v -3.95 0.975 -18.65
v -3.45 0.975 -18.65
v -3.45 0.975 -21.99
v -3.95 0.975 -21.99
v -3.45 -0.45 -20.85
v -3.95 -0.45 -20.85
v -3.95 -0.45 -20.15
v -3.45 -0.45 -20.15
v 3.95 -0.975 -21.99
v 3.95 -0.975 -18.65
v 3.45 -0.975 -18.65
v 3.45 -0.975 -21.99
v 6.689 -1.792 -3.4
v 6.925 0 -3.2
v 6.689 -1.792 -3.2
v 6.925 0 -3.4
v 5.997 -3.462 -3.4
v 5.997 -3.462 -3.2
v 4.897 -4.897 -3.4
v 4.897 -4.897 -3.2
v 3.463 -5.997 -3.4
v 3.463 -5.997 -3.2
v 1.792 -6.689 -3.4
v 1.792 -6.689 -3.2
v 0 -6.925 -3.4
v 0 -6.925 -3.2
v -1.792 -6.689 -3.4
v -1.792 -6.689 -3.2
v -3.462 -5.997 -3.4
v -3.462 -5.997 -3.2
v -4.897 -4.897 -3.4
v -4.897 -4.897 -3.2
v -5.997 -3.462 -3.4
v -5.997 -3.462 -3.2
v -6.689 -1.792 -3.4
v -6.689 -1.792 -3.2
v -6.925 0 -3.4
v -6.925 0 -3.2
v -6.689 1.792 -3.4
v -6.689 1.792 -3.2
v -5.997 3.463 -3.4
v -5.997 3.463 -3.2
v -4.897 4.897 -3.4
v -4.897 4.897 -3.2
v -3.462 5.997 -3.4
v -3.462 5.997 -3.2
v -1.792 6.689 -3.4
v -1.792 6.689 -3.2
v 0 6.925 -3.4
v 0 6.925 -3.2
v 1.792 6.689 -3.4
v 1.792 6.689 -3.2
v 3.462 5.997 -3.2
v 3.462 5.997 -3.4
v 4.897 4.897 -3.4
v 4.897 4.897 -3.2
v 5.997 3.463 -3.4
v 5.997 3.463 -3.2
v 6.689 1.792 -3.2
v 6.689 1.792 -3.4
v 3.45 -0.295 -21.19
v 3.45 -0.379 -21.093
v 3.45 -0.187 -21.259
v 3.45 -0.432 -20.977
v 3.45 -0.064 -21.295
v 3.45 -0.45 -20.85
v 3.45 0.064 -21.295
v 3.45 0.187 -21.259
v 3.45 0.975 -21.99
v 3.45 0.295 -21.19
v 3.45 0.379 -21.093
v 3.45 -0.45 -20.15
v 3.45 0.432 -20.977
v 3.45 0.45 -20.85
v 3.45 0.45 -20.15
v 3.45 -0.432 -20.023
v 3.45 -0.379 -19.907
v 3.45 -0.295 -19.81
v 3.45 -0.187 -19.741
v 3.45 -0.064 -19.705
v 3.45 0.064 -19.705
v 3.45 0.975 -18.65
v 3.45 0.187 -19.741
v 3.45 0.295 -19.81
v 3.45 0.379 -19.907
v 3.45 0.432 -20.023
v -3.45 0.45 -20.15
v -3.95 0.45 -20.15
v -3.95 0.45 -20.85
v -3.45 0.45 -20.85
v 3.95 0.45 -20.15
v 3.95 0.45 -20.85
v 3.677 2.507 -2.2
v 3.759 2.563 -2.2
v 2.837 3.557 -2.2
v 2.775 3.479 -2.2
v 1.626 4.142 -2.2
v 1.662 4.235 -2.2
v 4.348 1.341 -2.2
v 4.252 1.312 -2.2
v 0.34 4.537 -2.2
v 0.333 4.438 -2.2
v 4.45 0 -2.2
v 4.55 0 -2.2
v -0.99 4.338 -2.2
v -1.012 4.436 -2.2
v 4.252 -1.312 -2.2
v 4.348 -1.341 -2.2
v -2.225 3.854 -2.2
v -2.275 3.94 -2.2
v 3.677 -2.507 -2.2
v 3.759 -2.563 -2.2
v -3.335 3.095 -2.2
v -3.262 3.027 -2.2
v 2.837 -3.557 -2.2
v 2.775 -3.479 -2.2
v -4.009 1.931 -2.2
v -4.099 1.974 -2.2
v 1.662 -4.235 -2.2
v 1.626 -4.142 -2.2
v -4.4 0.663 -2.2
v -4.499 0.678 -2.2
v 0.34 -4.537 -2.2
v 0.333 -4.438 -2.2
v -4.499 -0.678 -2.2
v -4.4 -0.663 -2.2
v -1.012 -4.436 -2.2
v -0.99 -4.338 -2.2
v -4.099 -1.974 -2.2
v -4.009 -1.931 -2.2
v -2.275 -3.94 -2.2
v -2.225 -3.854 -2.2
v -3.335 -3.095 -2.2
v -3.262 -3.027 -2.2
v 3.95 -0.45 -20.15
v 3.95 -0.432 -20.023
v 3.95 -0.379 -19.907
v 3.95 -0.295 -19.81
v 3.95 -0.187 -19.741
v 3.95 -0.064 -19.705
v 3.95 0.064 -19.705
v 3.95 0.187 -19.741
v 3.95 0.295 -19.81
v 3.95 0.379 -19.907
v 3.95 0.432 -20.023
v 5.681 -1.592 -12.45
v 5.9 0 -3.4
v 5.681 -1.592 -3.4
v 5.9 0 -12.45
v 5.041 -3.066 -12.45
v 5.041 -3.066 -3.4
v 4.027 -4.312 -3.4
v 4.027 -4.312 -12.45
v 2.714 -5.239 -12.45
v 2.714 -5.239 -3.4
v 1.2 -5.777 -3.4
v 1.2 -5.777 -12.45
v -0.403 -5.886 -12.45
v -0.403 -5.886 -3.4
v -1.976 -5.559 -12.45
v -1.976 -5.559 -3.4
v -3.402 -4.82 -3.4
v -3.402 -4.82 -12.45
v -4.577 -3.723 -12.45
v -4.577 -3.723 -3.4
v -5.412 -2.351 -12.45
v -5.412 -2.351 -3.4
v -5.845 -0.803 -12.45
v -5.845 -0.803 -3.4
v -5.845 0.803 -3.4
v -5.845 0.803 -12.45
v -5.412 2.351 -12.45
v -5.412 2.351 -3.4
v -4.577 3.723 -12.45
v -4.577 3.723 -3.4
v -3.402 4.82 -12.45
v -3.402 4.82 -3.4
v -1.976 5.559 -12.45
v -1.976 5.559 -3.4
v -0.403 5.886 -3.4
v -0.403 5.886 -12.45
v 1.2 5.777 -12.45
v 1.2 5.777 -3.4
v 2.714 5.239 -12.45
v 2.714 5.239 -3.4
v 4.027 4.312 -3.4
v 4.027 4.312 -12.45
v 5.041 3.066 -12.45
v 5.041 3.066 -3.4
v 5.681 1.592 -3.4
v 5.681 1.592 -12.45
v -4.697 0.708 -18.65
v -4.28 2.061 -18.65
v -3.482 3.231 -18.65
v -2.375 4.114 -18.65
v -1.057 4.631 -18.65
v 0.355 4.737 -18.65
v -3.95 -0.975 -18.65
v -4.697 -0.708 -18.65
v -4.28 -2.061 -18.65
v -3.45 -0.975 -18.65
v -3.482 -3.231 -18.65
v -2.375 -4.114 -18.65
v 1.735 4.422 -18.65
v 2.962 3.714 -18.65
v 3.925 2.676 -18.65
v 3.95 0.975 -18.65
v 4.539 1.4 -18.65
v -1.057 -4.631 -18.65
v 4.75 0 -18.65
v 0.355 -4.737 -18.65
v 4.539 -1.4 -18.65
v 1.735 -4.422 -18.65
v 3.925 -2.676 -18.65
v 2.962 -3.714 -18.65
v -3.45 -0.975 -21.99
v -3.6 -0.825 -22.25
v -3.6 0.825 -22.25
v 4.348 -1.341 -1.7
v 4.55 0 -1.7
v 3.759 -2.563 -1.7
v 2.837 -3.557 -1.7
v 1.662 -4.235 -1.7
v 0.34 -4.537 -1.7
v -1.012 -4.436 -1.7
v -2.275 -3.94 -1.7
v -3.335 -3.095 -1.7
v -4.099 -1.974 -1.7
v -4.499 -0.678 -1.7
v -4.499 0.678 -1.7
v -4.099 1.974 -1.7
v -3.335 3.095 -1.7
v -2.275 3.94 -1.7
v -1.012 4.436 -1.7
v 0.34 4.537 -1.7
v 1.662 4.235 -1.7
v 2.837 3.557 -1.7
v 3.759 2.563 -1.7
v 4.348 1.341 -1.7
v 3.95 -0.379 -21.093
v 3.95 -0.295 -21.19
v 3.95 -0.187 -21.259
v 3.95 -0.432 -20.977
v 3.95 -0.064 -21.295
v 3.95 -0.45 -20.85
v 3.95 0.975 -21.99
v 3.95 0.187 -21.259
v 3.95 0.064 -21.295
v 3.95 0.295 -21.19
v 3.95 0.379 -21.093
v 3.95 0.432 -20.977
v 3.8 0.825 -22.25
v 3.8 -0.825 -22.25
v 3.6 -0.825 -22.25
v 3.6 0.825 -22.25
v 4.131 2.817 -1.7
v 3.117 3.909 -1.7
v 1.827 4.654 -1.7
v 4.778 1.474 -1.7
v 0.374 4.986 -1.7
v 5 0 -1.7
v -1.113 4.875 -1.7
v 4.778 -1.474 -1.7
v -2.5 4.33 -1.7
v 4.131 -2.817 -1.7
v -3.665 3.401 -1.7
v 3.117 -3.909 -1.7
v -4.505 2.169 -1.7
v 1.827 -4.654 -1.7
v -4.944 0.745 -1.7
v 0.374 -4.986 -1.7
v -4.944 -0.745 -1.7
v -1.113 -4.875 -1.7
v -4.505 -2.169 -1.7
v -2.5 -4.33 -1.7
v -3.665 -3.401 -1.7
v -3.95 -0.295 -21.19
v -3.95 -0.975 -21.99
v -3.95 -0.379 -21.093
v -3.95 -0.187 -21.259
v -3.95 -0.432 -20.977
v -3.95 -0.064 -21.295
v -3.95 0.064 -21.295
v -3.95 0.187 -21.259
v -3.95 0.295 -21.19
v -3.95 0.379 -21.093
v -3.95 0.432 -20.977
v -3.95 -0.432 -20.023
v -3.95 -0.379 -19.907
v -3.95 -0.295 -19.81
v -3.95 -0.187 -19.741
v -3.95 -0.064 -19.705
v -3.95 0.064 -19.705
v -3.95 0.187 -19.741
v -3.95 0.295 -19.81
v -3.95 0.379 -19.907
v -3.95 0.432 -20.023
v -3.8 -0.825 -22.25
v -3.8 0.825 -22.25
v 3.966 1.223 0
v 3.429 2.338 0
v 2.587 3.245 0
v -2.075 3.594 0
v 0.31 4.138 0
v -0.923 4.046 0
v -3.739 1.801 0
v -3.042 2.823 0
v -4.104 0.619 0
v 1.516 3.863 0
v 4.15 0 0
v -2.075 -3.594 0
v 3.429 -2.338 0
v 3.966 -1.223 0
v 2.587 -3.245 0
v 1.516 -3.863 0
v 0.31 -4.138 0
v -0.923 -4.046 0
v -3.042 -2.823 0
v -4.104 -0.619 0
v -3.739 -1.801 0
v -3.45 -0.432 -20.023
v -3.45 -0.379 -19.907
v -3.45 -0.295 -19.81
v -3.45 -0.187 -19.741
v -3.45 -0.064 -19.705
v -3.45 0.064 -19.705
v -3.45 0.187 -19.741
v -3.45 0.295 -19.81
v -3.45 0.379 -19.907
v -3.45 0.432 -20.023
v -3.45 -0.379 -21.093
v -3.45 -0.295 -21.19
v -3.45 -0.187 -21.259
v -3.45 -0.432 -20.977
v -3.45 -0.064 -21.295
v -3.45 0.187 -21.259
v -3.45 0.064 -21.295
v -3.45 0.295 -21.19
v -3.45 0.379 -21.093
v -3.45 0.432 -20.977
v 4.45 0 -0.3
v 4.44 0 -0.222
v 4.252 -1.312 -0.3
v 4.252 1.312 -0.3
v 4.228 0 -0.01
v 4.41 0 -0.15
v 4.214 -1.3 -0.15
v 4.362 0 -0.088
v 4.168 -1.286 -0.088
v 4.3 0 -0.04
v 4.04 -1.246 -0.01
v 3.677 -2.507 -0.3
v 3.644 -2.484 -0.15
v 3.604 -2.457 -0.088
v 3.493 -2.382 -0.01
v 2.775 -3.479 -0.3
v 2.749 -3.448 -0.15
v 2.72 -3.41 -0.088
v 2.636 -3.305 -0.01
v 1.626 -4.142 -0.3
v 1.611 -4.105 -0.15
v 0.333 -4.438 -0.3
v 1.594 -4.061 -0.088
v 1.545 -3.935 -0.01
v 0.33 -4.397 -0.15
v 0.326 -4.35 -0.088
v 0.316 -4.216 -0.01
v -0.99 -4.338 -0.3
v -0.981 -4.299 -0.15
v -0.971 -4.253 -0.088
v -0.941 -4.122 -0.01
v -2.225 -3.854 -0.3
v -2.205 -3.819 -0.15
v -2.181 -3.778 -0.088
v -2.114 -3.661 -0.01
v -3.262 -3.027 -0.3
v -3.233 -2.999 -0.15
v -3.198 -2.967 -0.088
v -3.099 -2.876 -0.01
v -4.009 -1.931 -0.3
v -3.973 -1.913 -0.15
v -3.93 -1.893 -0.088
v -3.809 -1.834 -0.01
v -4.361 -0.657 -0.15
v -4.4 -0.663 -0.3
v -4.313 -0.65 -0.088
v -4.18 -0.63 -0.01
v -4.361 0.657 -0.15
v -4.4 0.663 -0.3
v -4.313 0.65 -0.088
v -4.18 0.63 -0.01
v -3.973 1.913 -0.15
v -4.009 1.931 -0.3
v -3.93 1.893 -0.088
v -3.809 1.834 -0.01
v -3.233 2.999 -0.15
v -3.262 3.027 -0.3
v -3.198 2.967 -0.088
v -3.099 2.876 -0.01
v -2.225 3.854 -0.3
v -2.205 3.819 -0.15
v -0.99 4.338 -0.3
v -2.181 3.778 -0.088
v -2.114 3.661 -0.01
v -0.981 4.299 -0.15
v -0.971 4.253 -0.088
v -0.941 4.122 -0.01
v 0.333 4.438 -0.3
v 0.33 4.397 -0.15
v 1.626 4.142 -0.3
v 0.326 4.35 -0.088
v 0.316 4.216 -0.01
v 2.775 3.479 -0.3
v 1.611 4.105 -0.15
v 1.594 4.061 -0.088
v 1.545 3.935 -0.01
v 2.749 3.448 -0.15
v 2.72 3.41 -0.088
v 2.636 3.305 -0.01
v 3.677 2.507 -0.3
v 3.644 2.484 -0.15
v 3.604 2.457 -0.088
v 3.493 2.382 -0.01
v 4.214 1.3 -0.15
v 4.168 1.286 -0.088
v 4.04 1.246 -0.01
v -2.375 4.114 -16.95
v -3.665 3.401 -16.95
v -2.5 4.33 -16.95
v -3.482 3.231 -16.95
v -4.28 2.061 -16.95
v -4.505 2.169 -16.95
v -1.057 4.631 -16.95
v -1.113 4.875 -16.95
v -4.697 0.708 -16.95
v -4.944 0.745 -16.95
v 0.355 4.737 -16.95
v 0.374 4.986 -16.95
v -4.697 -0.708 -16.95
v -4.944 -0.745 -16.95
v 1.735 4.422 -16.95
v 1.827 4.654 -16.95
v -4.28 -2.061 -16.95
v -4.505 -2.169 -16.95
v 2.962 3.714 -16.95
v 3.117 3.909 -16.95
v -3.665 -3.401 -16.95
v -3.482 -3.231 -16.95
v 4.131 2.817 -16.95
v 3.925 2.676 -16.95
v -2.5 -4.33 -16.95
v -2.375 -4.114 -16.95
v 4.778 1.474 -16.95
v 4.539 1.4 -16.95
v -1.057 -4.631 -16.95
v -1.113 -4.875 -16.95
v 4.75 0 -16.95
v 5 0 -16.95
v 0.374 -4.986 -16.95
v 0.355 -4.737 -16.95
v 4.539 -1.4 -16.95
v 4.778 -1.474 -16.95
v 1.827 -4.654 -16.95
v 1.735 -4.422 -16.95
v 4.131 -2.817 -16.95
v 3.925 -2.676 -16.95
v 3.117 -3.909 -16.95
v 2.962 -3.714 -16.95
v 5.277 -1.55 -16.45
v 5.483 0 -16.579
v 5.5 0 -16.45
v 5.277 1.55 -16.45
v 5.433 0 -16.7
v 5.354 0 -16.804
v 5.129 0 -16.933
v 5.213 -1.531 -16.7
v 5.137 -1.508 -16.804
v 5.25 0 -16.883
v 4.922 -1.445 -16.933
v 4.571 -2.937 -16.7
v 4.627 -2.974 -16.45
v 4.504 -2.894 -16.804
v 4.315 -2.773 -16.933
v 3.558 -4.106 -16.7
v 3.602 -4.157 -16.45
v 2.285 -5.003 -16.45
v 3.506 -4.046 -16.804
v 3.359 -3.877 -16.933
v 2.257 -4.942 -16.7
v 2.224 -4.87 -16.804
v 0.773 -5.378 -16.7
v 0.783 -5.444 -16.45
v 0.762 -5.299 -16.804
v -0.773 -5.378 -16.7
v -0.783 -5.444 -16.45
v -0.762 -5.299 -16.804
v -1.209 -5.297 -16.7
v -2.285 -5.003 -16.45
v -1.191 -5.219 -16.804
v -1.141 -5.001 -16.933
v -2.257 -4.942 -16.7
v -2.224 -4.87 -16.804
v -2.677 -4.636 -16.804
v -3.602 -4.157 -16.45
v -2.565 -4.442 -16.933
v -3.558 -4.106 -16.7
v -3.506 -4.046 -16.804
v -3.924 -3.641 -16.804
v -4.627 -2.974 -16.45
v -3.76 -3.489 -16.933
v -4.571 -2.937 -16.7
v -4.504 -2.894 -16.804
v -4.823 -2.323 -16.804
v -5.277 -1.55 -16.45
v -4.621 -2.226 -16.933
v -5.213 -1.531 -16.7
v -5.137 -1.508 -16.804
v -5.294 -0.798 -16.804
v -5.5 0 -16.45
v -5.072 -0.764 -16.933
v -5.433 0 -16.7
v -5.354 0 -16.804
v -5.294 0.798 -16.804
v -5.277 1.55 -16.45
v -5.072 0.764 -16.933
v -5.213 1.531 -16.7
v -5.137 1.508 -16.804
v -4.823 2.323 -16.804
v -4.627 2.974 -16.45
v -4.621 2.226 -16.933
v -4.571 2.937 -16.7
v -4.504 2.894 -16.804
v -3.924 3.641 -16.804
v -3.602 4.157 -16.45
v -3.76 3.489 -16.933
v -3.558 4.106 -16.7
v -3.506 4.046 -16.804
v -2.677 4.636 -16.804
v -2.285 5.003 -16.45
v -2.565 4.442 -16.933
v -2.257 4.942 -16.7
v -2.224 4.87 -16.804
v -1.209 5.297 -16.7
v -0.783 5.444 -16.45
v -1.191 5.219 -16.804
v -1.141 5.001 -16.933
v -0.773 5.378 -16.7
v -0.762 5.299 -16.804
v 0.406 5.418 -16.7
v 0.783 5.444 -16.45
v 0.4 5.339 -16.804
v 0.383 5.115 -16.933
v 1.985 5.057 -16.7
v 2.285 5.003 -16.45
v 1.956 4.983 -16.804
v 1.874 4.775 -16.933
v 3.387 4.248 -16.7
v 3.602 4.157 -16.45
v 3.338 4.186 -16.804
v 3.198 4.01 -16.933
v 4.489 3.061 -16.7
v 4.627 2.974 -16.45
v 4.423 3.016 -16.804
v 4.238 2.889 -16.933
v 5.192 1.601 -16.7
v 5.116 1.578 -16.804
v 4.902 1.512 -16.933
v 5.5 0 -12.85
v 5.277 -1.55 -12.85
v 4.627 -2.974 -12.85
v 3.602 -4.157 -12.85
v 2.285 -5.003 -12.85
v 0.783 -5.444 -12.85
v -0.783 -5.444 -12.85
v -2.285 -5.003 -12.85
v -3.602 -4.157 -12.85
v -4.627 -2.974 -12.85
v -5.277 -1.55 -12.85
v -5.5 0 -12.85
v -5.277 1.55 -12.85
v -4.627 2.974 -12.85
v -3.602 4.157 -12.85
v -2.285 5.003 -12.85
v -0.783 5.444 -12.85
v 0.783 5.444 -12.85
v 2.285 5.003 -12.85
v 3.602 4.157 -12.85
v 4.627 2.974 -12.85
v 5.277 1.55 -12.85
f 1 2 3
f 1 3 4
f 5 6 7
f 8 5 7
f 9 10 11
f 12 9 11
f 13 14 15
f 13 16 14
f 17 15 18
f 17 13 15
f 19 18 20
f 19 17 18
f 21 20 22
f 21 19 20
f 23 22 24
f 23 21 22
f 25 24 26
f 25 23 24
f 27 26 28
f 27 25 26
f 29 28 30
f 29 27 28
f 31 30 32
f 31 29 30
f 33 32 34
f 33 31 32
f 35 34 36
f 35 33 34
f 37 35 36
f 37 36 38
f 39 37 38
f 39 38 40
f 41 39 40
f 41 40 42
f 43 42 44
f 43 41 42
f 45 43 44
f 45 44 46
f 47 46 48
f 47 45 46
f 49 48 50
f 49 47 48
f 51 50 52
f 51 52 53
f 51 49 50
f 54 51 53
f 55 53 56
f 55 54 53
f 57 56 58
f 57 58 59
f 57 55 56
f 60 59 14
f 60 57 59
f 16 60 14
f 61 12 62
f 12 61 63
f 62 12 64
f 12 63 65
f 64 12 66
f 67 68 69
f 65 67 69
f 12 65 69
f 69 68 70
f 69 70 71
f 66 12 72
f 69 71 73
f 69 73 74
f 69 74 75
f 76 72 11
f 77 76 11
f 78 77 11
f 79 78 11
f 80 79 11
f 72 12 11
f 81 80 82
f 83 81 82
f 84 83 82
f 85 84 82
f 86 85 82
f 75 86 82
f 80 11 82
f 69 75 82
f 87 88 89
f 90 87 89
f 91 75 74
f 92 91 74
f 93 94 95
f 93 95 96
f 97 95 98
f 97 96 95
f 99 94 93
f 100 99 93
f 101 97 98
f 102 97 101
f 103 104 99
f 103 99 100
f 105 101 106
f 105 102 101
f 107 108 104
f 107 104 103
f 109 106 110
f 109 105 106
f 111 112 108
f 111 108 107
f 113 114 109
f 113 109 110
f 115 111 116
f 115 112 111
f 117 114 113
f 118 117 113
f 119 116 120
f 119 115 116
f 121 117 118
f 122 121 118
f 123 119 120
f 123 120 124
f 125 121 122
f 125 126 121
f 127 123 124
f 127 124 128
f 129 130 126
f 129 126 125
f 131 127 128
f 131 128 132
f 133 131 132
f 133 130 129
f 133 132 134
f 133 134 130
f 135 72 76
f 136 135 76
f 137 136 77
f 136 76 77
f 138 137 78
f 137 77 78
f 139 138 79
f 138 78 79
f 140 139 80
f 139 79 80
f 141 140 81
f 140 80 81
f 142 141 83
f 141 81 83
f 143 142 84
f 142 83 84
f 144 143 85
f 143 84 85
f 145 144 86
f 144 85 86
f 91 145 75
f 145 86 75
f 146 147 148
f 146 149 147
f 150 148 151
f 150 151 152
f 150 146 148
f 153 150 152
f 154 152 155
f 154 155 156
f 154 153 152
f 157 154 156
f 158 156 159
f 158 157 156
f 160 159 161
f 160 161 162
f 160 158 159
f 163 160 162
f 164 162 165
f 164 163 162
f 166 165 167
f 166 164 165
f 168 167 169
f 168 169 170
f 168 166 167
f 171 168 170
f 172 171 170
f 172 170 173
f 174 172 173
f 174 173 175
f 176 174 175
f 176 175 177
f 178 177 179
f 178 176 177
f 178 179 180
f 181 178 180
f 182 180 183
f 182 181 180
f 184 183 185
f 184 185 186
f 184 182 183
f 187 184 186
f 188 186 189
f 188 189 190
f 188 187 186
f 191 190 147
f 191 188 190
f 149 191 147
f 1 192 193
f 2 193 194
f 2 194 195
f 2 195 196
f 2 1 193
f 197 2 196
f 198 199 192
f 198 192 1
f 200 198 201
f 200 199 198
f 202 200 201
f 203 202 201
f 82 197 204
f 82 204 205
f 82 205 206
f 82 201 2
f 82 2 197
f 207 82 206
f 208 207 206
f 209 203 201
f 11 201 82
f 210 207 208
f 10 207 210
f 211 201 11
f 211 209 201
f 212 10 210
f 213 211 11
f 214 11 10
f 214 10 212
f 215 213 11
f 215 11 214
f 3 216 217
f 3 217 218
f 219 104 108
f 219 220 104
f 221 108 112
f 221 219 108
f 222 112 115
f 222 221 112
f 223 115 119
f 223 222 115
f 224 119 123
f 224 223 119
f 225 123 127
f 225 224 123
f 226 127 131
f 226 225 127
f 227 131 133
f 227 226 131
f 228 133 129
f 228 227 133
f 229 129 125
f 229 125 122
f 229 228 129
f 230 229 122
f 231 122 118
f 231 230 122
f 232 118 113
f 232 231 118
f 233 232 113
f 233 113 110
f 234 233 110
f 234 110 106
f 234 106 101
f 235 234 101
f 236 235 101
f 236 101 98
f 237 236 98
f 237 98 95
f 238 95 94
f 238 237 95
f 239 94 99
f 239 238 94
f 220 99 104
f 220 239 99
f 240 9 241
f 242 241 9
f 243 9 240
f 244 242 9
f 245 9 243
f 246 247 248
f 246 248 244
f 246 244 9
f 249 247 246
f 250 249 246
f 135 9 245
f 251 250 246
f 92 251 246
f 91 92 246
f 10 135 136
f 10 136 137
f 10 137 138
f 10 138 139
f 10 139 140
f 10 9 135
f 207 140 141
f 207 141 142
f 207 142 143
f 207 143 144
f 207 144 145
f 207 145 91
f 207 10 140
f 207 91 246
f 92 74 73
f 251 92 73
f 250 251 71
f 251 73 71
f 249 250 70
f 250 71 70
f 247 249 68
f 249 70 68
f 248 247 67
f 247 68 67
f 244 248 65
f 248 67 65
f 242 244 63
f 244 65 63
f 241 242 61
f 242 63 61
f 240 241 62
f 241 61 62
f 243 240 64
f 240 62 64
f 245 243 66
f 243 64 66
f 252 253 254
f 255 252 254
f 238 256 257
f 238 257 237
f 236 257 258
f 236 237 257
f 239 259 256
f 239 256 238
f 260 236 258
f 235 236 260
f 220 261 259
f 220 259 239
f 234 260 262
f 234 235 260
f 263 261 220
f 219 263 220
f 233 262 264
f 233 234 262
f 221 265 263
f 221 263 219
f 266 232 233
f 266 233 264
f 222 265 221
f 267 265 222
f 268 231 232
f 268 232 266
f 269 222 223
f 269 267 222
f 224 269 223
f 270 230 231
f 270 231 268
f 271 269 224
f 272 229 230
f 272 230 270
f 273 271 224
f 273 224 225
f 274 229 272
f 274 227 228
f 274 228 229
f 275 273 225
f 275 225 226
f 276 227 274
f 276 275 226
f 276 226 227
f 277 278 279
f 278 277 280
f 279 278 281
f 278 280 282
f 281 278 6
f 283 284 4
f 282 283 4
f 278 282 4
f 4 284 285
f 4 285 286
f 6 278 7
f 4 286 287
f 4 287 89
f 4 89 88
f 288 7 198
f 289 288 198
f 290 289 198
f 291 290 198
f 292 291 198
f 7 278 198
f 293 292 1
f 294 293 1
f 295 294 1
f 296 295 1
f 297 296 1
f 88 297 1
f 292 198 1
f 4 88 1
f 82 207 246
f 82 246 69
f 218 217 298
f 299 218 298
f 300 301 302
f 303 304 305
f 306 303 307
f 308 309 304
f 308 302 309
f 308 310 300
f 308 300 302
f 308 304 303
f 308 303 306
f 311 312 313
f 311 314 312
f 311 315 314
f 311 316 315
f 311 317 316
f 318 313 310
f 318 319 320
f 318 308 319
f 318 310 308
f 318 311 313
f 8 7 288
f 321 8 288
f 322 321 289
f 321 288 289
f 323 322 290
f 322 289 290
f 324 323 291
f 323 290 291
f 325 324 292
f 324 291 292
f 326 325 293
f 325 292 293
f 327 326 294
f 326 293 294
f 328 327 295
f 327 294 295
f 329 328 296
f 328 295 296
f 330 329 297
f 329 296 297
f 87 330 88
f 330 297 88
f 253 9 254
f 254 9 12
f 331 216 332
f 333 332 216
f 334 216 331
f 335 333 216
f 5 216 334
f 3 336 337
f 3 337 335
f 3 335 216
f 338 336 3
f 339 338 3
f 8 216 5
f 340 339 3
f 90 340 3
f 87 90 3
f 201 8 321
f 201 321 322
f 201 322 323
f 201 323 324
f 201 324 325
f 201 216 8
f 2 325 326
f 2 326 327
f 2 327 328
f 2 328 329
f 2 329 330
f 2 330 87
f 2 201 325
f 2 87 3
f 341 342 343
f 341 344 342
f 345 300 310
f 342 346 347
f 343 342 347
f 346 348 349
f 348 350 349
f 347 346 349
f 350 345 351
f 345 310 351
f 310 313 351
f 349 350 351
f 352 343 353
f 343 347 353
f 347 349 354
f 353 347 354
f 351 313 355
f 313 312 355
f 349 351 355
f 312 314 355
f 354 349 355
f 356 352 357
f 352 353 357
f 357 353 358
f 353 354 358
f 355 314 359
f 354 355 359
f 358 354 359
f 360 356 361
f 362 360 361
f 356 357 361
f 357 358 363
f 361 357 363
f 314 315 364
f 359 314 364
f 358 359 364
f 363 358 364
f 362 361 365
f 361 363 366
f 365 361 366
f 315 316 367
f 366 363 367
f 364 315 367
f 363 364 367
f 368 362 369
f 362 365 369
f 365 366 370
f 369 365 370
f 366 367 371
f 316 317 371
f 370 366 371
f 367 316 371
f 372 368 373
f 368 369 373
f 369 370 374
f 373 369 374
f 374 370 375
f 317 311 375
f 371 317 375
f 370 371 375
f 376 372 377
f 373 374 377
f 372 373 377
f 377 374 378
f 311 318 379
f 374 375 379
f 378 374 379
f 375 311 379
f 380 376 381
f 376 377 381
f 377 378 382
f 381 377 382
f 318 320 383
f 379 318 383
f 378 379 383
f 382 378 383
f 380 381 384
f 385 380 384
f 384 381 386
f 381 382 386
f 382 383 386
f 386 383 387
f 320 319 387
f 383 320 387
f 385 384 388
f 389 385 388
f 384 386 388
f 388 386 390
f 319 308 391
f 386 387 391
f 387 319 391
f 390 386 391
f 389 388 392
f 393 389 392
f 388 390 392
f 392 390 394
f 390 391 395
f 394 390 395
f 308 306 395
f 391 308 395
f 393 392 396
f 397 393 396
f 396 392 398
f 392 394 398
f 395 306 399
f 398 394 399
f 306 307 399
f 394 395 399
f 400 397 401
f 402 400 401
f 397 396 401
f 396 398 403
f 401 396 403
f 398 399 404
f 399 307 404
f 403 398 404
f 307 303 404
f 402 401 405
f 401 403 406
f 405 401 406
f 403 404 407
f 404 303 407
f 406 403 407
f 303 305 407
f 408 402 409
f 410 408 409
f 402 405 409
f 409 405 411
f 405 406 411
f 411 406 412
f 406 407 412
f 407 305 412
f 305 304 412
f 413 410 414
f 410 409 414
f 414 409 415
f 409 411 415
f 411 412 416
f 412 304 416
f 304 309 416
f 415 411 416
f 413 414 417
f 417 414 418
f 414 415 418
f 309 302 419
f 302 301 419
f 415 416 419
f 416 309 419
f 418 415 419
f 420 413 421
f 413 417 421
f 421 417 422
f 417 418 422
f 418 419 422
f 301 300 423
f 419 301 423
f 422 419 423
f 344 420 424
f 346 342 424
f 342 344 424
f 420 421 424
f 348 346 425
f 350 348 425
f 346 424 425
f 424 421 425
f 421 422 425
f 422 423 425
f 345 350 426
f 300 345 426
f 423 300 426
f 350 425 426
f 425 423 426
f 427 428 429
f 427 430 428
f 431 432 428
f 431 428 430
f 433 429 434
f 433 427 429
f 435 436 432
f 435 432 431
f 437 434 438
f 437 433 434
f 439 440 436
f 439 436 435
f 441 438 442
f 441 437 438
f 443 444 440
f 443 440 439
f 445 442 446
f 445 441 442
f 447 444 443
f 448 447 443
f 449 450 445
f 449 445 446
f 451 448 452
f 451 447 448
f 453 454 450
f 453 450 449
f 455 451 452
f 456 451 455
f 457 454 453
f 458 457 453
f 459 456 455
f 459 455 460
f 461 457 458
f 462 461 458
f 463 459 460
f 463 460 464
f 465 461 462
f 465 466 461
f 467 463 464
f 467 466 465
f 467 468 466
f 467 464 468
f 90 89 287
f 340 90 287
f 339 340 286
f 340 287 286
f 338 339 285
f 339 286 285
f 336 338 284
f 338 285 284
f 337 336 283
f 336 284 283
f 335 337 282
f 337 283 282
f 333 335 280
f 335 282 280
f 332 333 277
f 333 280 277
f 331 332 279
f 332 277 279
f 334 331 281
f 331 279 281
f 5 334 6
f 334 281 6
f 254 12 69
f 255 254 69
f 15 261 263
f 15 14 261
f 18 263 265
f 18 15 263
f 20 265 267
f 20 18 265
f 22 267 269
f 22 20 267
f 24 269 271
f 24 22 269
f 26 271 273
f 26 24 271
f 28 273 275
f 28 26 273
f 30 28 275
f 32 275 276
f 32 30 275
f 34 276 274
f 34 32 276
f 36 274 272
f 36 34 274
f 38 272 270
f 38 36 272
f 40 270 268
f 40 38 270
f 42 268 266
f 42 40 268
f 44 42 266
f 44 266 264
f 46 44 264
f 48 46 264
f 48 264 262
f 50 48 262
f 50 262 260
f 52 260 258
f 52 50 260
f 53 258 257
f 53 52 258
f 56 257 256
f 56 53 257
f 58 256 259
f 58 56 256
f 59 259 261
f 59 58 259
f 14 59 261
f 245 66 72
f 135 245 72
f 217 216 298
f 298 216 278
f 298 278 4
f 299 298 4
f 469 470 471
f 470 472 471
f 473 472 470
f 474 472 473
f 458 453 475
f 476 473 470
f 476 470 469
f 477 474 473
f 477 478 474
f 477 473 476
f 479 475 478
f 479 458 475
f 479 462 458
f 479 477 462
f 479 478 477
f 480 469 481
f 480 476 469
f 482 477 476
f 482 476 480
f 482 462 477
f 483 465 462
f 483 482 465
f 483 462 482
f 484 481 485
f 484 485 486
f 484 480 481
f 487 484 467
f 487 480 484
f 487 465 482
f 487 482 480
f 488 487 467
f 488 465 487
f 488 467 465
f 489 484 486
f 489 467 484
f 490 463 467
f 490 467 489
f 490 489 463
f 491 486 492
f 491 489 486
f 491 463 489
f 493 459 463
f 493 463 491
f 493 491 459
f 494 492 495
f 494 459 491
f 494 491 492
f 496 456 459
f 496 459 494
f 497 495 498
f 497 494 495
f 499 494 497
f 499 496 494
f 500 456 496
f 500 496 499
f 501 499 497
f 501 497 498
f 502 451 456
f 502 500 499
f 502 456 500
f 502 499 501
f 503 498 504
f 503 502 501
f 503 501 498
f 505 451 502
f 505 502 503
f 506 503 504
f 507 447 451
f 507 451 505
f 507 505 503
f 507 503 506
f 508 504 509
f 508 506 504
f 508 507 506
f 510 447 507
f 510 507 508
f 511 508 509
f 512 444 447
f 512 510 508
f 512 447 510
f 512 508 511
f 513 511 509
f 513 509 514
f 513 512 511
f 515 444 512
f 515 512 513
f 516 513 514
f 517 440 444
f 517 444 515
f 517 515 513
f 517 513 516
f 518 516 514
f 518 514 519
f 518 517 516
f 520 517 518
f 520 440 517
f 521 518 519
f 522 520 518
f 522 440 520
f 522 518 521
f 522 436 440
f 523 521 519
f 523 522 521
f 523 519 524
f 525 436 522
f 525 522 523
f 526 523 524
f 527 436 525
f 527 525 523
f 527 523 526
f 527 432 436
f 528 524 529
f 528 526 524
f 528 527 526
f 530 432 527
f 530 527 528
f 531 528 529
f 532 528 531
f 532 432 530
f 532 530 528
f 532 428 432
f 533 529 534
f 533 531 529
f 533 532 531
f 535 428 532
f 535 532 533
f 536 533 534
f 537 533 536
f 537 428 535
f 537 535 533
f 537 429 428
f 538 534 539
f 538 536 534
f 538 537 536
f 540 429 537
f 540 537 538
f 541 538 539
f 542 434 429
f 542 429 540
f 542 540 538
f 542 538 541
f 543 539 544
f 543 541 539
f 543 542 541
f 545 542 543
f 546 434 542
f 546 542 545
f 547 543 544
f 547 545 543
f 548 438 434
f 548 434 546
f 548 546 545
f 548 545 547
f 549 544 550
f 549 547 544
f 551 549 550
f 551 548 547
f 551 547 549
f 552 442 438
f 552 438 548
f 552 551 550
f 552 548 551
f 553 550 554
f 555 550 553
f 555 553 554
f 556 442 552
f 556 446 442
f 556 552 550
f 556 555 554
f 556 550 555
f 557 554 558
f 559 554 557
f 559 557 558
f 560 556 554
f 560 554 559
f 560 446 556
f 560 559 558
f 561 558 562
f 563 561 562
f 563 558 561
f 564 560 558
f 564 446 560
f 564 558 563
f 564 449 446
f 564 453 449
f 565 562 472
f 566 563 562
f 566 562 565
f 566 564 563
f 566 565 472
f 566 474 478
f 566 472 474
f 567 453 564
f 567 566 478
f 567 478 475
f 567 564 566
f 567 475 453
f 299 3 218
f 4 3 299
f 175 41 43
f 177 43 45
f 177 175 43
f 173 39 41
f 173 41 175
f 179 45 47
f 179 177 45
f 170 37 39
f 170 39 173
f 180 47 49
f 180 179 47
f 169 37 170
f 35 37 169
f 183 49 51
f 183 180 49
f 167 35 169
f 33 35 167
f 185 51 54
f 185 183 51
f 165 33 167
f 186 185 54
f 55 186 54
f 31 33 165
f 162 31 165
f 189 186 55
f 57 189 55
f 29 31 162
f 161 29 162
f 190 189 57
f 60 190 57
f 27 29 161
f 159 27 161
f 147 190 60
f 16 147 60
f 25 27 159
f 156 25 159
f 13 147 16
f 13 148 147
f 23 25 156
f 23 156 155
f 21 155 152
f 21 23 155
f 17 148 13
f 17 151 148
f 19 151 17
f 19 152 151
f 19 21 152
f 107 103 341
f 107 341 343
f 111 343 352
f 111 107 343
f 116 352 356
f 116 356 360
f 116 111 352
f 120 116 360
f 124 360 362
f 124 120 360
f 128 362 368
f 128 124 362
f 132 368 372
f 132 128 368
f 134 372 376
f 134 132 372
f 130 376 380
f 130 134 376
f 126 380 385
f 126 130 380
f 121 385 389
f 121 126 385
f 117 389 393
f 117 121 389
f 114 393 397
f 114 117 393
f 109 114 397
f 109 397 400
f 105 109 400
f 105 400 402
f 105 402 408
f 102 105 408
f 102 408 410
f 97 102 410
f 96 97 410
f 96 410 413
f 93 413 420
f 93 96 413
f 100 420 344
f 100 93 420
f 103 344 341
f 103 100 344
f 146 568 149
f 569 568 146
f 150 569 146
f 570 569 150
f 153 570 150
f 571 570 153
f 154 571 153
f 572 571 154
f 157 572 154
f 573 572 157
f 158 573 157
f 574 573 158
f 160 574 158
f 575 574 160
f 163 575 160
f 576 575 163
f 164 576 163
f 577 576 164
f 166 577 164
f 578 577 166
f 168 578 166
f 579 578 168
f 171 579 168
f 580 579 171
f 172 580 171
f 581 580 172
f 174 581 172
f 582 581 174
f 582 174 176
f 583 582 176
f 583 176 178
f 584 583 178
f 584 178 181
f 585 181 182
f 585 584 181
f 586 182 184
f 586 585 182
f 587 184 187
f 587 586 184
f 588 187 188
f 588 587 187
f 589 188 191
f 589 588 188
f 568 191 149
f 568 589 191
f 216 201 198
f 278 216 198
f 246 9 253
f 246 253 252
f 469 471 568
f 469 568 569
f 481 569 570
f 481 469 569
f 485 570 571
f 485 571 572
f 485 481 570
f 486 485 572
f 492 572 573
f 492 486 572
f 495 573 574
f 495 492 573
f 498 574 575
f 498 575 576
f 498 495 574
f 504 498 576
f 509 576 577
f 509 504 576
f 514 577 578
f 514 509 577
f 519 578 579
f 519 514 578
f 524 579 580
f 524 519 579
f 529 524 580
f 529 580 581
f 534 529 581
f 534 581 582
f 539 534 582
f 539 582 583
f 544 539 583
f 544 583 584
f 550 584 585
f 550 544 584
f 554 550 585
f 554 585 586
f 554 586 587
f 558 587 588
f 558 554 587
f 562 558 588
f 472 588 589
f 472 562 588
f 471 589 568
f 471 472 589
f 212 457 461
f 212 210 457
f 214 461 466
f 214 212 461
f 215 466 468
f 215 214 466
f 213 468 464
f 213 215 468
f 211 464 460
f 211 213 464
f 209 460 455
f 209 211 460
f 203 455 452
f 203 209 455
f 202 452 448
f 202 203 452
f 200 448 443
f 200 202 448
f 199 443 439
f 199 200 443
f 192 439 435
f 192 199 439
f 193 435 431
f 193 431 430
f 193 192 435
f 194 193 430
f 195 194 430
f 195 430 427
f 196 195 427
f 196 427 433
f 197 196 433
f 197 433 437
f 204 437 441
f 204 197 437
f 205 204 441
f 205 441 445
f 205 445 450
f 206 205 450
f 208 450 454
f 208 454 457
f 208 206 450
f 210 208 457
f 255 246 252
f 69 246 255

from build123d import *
from OCP.BRepFilletAPI import BRepFilletAPI_MakeChamfer

# Parameters (mm, degrees)
FILLET2_R               = 0.5
FILLET3_R               = 0.3
SKETCH9_W               = 0.5
SKETCH9_H               = 1.95
BOSS_EXTRUDE5_DEPTH     = 3.6
CHAMFER2_SIZE           = 0.15
CHAMFER2_SIZE2          = 0.259807621
CUT_EXTRUDE2_DEPTH      = 25.309951666
CUT_EXTRUDE2_DEPTH_BACK = 25.309951666


with BuildPart() as part:
    # Sketch8 → Revolve1 (revolve)
    with BuildSketch(Plane(origin=(0, 0, 0), x_dir=(0, 0, -1), z_dir=(1, 0, 0)), mode=Mode.PRIVATE) as revolve1_sk:
        Polygon((0, 0), (0, 4.45), (2.2, 4.45), (2.2, 4.55), (1.7, 4.55), (1.7, 5), (3.2, 6.925), (3.4, 6.925), (3.4, 5.9), (12.45, 5.9), (12.85, 5.5), (16.95, 5.5), (16.95, 4.75), (18.65, 4.75), (18.65, 0), align=None)
    revolve(revolve1_sk.sketch.rotate(Axis((0, 0, 0), (0, 0, -1)), 90), axis=Axis((0, 0, 0), (0, 0, -1)))

    # Fillet2
    fillet2_edges = [part.edges().sort_by_distance(p)[0] for p in [
        (-5.5, 0, -16.95),
    ]]
    fillet(fillet2_edges, radius=FILLET2_R)

    # Fillet3
    fillet3_edges = [part.edges().sort_by_distance(p)[0] for p in [
        (-4.45, 0, 0),
    ]]
    fillet(fillet3_edges, radius=FILLET3_R)

    # Sketch9 → Boss-Extrude5 (add)
    with BuildSketch(Plane(origin=(0, 0, -18.65), x_dir=(-1, 0, 0), z_dir=(0, 0, -1))):
        with Locations((-3.7, 0)):
            Rectangle(SKETCH9_W, SKETCH9_H)
        with Locations((3.7, 0)):
            Rectangle(SKETCH9_W, SKETCH9_H)
    extrude(amount=BOSS_EXTRUDE5_DEPTH)

    # Chamfer2: one chamfer whose edges measure the first distance from different faces: ONE call of the kernel's chamfer builder (chamfer() names one face for all edges)
    chamfer2_edges_1 = [part.edges().sort_by_distance(p)[0] for p in [
        (3.45, 0, -22.25),
        (3.7, 0.975, -22.25),
        (3.95, 0, -22.25),
        (3.7, -0.975, -22.25),
    ]]
    chamfer2_side_1 = [part.faces().sort_by_distance(p)[0] for p in [
        (3.7, 0, -22.25),
    ]]
    chamfer2_edges_2 = [part.edges().sort_by_distance(p)[0] for p in [
        (-3.95, 0, -22.25),
        (-3.7, 0.975, -22.25),
        (-3.45, 0, -22.25),
        (-3.7, -0.975, -22.25),
    ]]
    chamfer2_side_2 = [part.faces().sort_by_distance(p)[0] for p in [
        (-3.7, 0, -22.25),
    ]]
    chamfer2 = BRepFilletAPI_MakeChamfer(part.part.solid().wrapped)
    for e in chamfer2_edges_1:
        chamfer2.Add(CHAMFER2_SIZE, CHAMFER2_SIZE2, e.wrapped, chamfer2_side_1[0].wrapped)  # the first distance lies on this face
    for e in chamfer2_edges_2:
        chamfer2.Add(CHAMFER2_SIZE, CHAMFER2_SIZE2, e.wrapped, chamfer2_side_2[0].wrapped)  # the first distance lies on this face
    add(Compound.cast(chamfer2.Shape()), mode=Mode.REPLACE)

    # Sketch10 → Cut-Extrude2 (cut, two sides: drawn at the far end of the back side and taken through both)
    with BuildSketch(Plane(origin=(0, 0, 0), x_dir=(0, 0, -1), z_dir=(1, 0, 0)).offset(-CUT_EXTRUDE2_DEPTH_BACK)):
        with BuildLine():
            Line((20.15, 0.45), (20.85, 0.45))
            ThreePointArc((20.85, 0.45), (21.3, 0), (20.85, -0.45))
            Line((20.85, -0.45), (20.15, -0.45))
            ThreePointArc((20.15, -0.45), (19.7, 0), (20.15, 0.45))
        make_face()
    extrude(amount=CUT_EXTRUDE2_DEPTH + CUT_EXTRUDE2_DEPTH_BACK, mode=Mode.SUBTRACT)


solid = part.part
